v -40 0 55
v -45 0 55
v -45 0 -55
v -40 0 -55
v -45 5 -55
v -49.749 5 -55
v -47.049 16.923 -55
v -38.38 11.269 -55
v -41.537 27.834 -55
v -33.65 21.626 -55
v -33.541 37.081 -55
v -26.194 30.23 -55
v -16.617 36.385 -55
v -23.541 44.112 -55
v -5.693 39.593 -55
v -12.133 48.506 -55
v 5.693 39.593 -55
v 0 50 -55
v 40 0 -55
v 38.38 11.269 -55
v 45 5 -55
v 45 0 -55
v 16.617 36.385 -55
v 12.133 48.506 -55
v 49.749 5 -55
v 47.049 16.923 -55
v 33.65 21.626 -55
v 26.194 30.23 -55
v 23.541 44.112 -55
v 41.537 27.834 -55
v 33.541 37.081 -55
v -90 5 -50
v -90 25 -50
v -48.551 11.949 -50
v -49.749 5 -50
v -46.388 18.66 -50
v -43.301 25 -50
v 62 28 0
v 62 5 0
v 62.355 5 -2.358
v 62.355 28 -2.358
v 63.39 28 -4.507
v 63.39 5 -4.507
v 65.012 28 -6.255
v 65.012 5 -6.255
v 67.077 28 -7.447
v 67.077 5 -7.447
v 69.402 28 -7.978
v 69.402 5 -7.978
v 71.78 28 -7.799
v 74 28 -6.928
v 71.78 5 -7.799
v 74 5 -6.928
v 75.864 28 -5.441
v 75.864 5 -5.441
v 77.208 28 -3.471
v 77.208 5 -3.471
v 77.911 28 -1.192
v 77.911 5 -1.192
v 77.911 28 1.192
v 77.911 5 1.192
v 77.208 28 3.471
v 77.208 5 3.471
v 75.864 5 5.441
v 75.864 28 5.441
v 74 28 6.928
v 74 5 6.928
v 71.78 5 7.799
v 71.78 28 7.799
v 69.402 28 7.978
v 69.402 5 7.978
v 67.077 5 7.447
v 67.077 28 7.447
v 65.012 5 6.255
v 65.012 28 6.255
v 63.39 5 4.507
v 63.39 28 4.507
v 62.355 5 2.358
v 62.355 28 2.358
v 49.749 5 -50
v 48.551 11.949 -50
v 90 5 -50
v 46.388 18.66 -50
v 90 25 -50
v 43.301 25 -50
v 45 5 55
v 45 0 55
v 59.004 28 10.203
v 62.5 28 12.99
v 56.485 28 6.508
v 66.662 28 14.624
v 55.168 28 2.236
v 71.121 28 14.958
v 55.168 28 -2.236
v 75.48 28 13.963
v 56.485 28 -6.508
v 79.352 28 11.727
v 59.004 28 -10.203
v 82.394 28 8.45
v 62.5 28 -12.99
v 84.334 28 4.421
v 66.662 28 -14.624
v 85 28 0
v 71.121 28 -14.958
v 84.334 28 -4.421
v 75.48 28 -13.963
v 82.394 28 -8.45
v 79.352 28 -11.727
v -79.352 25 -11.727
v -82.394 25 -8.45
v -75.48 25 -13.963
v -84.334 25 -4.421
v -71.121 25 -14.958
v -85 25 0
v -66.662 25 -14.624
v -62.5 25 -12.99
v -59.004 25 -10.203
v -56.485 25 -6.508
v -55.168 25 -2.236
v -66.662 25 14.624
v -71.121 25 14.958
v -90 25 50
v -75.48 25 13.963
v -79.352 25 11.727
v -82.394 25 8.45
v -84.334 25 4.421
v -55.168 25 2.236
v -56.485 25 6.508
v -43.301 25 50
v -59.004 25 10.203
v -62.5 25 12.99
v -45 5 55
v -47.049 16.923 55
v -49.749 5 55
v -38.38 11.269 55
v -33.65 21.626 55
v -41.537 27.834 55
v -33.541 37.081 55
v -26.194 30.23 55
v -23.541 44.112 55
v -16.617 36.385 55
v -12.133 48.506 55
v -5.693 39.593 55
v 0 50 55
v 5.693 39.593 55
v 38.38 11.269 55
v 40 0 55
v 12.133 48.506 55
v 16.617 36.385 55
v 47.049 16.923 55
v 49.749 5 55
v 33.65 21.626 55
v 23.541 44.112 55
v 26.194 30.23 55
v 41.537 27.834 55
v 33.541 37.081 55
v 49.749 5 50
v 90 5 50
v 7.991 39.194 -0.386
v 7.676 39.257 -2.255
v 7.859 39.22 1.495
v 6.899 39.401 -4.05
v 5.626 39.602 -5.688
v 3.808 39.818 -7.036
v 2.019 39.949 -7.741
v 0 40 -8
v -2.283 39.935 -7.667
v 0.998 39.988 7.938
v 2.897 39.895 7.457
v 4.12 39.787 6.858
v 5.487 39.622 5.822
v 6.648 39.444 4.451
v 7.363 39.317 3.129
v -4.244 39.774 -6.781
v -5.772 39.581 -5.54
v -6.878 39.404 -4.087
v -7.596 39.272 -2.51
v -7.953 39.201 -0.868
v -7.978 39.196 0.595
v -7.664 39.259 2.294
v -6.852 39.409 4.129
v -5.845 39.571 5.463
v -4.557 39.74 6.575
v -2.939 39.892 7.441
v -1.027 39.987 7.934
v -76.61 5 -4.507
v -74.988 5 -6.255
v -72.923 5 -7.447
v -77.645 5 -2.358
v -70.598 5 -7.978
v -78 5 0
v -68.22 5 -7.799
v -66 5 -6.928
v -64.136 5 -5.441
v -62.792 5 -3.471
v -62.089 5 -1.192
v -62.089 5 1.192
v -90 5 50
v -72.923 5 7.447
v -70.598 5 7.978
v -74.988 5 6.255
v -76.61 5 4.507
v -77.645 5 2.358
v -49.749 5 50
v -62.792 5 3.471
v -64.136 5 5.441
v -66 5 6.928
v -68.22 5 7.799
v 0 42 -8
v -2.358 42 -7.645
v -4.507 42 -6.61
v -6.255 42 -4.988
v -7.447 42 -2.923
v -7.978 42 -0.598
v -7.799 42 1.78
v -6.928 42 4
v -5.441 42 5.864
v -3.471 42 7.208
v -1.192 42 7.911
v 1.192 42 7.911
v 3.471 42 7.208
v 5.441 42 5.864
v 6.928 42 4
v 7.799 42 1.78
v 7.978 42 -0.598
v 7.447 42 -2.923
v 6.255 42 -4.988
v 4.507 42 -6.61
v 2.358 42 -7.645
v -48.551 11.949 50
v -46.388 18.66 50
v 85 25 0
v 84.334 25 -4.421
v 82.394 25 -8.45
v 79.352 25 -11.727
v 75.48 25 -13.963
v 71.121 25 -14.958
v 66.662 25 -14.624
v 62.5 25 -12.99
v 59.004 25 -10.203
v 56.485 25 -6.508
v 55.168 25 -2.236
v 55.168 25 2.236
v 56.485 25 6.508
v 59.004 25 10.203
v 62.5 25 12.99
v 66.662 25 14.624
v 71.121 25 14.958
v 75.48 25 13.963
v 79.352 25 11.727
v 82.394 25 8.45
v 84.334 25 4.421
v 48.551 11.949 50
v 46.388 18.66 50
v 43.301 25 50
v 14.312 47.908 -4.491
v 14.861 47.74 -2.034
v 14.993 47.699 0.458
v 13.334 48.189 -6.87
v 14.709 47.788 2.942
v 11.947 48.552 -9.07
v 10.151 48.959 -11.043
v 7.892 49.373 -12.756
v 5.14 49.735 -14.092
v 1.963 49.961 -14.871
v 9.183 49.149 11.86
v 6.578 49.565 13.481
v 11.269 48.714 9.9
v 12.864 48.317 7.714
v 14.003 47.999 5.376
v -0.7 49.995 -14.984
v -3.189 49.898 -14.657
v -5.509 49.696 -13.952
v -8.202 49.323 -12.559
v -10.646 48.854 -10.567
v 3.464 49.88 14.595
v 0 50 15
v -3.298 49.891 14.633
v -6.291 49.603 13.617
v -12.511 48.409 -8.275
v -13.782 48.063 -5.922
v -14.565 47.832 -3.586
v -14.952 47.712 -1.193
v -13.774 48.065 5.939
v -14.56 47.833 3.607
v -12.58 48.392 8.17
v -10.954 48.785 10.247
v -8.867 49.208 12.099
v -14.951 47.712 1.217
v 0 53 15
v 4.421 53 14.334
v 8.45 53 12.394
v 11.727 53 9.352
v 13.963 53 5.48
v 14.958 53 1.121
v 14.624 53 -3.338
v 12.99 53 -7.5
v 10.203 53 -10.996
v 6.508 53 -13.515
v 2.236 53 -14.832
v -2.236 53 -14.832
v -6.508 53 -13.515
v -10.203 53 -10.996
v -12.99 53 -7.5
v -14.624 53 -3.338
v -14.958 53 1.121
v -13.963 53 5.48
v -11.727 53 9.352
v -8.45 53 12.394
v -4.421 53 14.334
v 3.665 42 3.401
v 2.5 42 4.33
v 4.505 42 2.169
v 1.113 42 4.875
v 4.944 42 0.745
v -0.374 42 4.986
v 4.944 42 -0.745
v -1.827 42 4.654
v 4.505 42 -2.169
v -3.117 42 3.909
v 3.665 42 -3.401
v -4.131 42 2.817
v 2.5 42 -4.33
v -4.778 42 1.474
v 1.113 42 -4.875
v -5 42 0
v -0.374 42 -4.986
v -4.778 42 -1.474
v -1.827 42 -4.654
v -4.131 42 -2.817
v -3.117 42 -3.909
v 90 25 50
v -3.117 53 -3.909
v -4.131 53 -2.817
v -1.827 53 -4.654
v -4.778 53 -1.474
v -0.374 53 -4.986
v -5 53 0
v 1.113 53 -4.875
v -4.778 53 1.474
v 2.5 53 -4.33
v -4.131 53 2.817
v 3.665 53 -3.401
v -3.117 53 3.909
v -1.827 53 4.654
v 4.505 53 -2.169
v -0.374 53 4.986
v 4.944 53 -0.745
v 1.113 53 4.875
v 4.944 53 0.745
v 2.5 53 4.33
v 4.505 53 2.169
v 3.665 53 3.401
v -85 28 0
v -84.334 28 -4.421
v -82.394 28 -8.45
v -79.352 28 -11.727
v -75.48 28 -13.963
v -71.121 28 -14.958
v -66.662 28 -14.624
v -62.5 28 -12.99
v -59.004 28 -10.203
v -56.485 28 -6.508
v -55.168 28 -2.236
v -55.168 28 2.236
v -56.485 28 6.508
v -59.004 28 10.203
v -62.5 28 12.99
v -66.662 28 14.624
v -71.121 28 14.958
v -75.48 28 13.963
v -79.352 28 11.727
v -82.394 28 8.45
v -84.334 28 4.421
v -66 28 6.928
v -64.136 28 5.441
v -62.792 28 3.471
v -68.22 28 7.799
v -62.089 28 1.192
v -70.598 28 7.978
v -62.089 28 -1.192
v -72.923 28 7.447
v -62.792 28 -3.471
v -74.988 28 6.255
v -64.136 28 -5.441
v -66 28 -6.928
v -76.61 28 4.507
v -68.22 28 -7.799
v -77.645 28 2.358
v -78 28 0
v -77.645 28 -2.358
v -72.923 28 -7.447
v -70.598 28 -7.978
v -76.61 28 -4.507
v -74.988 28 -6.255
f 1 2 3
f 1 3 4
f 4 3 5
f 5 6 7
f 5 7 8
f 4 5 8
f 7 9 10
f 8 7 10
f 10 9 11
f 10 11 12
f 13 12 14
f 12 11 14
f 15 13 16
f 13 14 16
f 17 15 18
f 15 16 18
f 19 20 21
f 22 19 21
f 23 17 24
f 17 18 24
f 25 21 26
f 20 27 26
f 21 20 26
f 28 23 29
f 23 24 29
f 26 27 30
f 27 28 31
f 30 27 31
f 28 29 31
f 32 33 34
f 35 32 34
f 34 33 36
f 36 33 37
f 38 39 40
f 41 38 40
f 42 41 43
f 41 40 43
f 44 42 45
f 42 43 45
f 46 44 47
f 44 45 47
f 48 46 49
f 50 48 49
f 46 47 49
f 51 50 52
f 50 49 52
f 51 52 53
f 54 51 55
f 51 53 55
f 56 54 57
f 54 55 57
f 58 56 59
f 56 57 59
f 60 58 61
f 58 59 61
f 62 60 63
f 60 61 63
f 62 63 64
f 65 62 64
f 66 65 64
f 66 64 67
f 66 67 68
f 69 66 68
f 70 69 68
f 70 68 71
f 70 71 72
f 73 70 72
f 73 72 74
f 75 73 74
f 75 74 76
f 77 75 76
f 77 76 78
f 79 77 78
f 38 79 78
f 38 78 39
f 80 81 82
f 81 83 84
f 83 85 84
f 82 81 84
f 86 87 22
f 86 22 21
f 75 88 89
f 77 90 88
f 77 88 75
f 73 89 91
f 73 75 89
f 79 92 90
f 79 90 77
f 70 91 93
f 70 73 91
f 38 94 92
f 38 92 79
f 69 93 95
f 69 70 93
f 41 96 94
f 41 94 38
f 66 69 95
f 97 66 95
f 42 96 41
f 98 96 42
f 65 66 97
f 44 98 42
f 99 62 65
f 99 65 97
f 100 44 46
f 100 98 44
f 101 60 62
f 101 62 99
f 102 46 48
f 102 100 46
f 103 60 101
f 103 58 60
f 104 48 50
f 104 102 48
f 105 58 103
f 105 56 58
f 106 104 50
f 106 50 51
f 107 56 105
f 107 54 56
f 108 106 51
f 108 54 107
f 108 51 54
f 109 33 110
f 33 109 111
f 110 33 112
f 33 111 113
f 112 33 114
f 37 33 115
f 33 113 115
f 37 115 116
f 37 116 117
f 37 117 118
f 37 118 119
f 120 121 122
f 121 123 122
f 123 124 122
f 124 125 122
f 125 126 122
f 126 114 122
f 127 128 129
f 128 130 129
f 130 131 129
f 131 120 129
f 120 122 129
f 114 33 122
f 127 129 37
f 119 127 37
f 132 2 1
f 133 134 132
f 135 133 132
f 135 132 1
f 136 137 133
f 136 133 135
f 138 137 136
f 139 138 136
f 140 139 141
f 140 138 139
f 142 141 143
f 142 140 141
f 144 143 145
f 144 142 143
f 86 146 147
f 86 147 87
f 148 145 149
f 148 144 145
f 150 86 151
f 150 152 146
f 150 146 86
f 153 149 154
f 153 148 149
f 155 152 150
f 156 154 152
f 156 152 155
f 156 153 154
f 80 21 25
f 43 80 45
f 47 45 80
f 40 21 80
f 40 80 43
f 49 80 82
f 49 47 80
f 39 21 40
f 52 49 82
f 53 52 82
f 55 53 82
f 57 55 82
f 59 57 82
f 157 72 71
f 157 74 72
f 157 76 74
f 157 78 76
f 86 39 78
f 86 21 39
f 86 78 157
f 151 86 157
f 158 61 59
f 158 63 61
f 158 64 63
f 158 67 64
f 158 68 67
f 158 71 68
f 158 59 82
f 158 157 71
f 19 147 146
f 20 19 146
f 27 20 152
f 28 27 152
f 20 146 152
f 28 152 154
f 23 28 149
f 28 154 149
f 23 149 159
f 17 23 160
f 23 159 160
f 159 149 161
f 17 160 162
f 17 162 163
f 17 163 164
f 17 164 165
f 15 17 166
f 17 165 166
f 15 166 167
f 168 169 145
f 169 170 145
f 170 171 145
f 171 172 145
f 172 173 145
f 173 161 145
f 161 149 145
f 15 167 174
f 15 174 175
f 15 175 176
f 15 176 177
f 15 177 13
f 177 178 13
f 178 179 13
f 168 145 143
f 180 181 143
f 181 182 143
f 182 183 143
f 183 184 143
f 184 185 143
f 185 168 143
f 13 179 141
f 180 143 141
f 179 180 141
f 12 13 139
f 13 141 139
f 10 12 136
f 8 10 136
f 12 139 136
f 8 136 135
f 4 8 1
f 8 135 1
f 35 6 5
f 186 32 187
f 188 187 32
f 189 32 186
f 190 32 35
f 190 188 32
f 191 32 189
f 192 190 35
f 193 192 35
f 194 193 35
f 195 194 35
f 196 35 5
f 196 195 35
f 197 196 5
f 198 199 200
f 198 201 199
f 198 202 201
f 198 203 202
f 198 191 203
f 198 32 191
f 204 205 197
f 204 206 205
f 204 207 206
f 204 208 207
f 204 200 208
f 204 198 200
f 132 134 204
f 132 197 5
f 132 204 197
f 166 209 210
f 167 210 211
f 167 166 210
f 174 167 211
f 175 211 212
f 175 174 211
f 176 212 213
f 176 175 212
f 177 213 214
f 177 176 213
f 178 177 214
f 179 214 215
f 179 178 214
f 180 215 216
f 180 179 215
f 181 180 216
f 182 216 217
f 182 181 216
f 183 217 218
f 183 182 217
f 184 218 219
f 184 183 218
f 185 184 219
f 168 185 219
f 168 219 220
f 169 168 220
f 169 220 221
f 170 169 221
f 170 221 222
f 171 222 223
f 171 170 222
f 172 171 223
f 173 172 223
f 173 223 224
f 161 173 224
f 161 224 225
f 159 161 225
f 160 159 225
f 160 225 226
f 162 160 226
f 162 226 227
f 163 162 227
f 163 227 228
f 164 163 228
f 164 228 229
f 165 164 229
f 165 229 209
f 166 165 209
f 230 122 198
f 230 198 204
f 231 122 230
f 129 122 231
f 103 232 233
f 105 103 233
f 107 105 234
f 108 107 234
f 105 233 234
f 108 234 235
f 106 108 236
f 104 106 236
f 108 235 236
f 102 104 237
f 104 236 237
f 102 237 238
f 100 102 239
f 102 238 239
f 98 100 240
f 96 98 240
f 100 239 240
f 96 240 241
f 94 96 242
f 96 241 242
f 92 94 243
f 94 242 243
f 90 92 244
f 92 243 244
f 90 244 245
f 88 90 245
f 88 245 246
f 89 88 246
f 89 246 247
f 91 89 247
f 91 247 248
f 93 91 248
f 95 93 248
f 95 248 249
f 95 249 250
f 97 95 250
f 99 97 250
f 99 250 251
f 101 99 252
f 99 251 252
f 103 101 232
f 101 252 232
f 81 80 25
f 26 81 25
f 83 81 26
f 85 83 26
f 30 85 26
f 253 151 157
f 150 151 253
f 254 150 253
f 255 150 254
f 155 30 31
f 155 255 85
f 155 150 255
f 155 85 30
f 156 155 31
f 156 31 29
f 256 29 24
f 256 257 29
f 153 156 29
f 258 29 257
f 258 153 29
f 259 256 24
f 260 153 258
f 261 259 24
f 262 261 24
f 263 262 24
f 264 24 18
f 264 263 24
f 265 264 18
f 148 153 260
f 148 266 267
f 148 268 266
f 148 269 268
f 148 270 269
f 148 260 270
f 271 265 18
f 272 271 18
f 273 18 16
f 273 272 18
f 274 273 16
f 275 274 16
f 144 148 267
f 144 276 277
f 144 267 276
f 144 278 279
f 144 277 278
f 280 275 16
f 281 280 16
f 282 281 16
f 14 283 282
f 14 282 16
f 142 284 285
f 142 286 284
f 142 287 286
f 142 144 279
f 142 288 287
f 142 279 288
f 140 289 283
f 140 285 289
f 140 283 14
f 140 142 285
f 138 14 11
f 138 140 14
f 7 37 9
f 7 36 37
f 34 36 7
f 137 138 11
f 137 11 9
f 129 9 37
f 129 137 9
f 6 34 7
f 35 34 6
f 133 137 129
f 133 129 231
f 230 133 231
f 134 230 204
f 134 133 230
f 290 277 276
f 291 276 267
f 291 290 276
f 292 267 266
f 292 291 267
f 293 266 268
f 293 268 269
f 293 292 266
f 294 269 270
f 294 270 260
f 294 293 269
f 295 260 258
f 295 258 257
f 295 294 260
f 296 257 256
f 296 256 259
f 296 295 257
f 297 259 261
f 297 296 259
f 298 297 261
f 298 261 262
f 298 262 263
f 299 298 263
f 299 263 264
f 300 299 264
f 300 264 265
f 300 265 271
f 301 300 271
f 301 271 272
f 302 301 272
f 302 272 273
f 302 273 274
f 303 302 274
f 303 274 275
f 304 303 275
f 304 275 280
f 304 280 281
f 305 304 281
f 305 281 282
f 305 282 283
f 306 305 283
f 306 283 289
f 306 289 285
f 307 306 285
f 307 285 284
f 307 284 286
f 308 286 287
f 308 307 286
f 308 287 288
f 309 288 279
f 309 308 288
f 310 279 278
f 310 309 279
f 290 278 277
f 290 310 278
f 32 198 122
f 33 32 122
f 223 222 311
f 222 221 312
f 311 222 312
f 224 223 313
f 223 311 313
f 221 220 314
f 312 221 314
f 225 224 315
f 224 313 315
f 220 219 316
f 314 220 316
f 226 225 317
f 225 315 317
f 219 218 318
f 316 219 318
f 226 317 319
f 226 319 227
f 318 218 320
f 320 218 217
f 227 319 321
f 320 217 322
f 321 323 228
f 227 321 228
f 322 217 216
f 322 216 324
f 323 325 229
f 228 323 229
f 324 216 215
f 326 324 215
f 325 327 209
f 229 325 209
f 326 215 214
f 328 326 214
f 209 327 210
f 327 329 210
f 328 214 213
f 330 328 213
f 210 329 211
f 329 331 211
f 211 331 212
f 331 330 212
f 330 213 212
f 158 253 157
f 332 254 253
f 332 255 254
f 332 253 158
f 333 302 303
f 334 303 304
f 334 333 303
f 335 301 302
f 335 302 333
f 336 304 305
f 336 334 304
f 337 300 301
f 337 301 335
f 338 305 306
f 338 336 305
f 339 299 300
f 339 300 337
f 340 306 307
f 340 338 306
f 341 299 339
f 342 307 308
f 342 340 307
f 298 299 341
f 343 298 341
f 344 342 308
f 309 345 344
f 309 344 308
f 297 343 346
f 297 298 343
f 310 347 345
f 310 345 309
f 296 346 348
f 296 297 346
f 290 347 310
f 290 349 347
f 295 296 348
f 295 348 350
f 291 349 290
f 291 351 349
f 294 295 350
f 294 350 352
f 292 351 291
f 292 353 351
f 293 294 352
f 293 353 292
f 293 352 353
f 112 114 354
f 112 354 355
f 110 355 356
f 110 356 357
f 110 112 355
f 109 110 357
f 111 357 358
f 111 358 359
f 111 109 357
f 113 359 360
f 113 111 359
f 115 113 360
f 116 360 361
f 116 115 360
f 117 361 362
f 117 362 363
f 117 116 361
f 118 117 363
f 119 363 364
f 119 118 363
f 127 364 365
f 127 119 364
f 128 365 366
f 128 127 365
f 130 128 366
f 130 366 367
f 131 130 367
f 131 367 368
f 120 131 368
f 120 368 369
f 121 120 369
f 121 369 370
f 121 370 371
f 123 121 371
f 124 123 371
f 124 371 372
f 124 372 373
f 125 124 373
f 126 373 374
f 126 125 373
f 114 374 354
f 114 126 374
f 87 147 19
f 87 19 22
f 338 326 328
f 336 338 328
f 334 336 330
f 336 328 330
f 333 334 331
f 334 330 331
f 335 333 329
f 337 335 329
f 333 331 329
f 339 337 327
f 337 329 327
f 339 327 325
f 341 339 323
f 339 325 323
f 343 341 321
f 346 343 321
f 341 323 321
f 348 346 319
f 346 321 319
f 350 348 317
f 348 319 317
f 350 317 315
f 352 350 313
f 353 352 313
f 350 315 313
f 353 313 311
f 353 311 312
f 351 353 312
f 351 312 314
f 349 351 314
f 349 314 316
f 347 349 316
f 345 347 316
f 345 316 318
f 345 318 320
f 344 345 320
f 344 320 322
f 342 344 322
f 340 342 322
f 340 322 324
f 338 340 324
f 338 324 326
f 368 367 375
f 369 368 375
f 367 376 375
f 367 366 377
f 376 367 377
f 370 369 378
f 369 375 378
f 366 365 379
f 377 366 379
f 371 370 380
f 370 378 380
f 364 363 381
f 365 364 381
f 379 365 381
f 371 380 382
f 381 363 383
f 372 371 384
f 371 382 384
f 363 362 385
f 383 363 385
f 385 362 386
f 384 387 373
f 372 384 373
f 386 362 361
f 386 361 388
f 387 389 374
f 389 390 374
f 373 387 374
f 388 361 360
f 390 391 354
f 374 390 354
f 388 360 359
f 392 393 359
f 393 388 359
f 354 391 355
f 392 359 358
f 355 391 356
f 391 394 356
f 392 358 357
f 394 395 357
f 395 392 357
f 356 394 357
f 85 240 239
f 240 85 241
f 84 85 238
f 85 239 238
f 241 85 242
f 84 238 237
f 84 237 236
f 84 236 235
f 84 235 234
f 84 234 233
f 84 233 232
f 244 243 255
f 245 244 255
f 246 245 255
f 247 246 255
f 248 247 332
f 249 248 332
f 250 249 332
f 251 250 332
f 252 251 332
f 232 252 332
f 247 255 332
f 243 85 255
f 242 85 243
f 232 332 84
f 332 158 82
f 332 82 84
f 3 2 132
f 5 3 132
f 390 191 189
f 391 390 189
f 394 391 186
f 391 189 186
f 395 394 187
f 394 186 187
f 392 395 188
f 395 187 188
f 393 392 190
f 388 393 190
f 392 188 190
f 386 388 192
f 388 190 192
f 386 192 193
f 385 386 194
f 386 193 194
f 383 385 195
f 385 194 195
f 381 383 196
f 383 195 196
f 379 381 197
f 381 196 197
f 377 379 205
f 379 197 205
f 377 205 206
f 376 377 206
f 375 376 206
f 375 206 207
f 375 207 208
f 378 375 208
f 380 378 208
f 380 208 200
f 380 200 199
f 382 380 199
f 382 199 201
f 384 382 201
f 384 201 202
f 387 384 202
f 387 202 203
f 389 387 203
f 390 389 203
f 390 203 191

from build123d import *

# Parameters (mm, degrees)
BOSS_EXTRUDE1_DEPTH      = 55
SKETCH4_W                = 180
SKETCH4_H                = 20
BOSS_EXTRUDE2_DEPTH      = 50
CUT_EXTRUDE1_REACH       = 152.665
SKETCH5_W                = 45
SKETCH5_H                = 5
CUT_EXTRUDE2_REACH       = 152.665
SKETCH7_R                = 15
BOSS_EXTRUDE3_DEPTH      = 3
HOLE1_D                  = 16
BOSS_EXTRUDE4_REACH      = 120.042
BOSS_EXTRUDE4_END_RADIUS = 50
SKETCH10_R               = 15
HOLE2_D                  = 10
SKETCH13_R               = 8
CUT_EXTRUDE3_DEPTH       = 42


with BuildPart() as part:
    # Sketch2 → Boss-Extrude1 (new, symmetric)
    with BuildSketch(Plane.XY):
        with BuildLine():
            Line((-50, 0), (50, 0))
            ThreePointArc((50, 0), (0, 50), (-50, 0))
        make_face()
    extrude(amount=BOSS_EXTRUDE1_DEPTH, both=True)

    # Sketch4 → Boss-Extrude2 (add, symmetric)
    with BuildSketch(Plane.XY):
        with Locations((0, 15)):
            Rectangle(SKETCH4_W, SKETCH4_H)
    extrude(amount=BOSS_EXTRUDE2_DEPTH, both=True)

    # Sketch5 → Cut-Extrude1 (cut, up to next)
    with BuildSketch(Plane.XY.offset(55), mode=Mode.PRIVATE) as cut_extrude1_sk1:
        with Locations((67.5, 2.5)):
            Rectangle(SKETCH5_W, SKETCH5_H)
    cut_extrude1_tool1 = extrude(cut_extrude1_sk1.sketch, amount=-CUT_EXTRUDE1_REACH, mode=Mode.PRIVATE) & part.part
    cut_extrude1 = cut_extrude1_tool1.solids().sort_by_distance((67.5, 2.5, 55))[0]
    add(cut_extrude1, mode=Mode.SUBTRACT)

    # Mirror1: Cut-Extrude1 across plane
    add(cut_extrude1.mirror(Plane(origin=(0, 0, 0), x_dir=(0, 0, 1), z_dir=(1, 0, 0))), mode=Mode.SUBTRACT)

    # Sketch6 → Cut-Extrude2 (cut, up to next)
    with BuildSketch(Plane.XY.offset(55), mode=Mode.PRIVATE) as cut_extrude2_sk1:
        with BuildLine():
            Line((-40, 0), (40, 0))
            ThreePointArc((40, 0), (0, 40), (-40, 0))
        make_face()
    cut_extrude2_tool1 = extrude(cut_extrude2_sk1.sketch, amount=-CUT_EXTRUDE2_REACH, mode=Mode.PRIVATE) & part.part
    add(cut_extrude2_tool1.solids().sort_by_distance((0, 16.976527, 55))[0], mode=Mode.SUBTRACT)

    # Sketch7 → Boss-Extrude3 (add)
    with BuildSketch(Plane(origin=(0, 25, 0), x_dir=(1, 0, 0), z_dir=(0, 1, 0))):
        with Locations((70, 0)):
            Circle(SKETCH7_R)
    boss_extrude3 = extrude(amount=BOSS_EXTRUDE3_DEPTH)

    # Mirror2: Boss-Extrude3 across plane
    add(boss_extrude3.mirror(Plane(origin=(0, 0, 0), x_dir=(0, 0, 1), z_dir=(1, 0, 0))))

    # Hole1 (through all)
    with Locations(Plane(origin=(0, 28, 0), x_dir=(1, 0, 0), z_dir=(0, 1, 0))):
        with Locations((70, 0), (-70, 0)):
            Hole(HOLE1_D / 2)

    # Boss-Extrude4: up to this cylinder (the profile starts outside it)
    boss_extrude4_end = Plane(origin=(0, 0, 0), z_dir=(0, 0, -1)) * Cylinder(BOSS_EXTRUDE4_END_RADIUS, 341.084, mode=Mode.PRIVATE)
    # Sketch10 → Boss-Extrude4 (add, up to the surface)
    with BuildSketch(Plane(origin=(0, 53, 0), x_dir=(1, 0, 0), z_dir=(0, 1, 0)), mode=Mode.PRIVATE) as boss_extrude4_sk1:
        with Locations(Location((0, 0, 0), (0, 0, 270))):
            Circle(SKETCH10_R)
    boss_extrude4_tool1 = extrude(boss_extrude4_sk1.sketch, amount=-BOSS_EXTRUDE4_REACH, mode=Mode.PRIVATE) - boss_extrude4_end
    add(boss_extrude4_tool1.solids().sort_by_distance((0, 53, 0))[0])

    # Hole2 (through all)
    with Locations(Plane(origin=(0, 53, 0), x_dir=(1, 0, 0), z_dir=(0, 1, 0))):
        with Locations((0, 0)):
            Hole(HOLE2_D / 2)

    # Sketch13 → Cut-Extrude3 (cut)
    with BuildSketch(Plane(origin=(0, 0, 0), x_dir=(1, 0, 0), z_dir=(0, 1, 0))):
        with Locations(Location((0, 0, 0), (0, 0, 90))):
            Circle(SKETCH13_R)
    extrude(amount=CUT_EXTRUDE3_DEPTH, mode=Mode.SUBTRACT)


solid = part.part
